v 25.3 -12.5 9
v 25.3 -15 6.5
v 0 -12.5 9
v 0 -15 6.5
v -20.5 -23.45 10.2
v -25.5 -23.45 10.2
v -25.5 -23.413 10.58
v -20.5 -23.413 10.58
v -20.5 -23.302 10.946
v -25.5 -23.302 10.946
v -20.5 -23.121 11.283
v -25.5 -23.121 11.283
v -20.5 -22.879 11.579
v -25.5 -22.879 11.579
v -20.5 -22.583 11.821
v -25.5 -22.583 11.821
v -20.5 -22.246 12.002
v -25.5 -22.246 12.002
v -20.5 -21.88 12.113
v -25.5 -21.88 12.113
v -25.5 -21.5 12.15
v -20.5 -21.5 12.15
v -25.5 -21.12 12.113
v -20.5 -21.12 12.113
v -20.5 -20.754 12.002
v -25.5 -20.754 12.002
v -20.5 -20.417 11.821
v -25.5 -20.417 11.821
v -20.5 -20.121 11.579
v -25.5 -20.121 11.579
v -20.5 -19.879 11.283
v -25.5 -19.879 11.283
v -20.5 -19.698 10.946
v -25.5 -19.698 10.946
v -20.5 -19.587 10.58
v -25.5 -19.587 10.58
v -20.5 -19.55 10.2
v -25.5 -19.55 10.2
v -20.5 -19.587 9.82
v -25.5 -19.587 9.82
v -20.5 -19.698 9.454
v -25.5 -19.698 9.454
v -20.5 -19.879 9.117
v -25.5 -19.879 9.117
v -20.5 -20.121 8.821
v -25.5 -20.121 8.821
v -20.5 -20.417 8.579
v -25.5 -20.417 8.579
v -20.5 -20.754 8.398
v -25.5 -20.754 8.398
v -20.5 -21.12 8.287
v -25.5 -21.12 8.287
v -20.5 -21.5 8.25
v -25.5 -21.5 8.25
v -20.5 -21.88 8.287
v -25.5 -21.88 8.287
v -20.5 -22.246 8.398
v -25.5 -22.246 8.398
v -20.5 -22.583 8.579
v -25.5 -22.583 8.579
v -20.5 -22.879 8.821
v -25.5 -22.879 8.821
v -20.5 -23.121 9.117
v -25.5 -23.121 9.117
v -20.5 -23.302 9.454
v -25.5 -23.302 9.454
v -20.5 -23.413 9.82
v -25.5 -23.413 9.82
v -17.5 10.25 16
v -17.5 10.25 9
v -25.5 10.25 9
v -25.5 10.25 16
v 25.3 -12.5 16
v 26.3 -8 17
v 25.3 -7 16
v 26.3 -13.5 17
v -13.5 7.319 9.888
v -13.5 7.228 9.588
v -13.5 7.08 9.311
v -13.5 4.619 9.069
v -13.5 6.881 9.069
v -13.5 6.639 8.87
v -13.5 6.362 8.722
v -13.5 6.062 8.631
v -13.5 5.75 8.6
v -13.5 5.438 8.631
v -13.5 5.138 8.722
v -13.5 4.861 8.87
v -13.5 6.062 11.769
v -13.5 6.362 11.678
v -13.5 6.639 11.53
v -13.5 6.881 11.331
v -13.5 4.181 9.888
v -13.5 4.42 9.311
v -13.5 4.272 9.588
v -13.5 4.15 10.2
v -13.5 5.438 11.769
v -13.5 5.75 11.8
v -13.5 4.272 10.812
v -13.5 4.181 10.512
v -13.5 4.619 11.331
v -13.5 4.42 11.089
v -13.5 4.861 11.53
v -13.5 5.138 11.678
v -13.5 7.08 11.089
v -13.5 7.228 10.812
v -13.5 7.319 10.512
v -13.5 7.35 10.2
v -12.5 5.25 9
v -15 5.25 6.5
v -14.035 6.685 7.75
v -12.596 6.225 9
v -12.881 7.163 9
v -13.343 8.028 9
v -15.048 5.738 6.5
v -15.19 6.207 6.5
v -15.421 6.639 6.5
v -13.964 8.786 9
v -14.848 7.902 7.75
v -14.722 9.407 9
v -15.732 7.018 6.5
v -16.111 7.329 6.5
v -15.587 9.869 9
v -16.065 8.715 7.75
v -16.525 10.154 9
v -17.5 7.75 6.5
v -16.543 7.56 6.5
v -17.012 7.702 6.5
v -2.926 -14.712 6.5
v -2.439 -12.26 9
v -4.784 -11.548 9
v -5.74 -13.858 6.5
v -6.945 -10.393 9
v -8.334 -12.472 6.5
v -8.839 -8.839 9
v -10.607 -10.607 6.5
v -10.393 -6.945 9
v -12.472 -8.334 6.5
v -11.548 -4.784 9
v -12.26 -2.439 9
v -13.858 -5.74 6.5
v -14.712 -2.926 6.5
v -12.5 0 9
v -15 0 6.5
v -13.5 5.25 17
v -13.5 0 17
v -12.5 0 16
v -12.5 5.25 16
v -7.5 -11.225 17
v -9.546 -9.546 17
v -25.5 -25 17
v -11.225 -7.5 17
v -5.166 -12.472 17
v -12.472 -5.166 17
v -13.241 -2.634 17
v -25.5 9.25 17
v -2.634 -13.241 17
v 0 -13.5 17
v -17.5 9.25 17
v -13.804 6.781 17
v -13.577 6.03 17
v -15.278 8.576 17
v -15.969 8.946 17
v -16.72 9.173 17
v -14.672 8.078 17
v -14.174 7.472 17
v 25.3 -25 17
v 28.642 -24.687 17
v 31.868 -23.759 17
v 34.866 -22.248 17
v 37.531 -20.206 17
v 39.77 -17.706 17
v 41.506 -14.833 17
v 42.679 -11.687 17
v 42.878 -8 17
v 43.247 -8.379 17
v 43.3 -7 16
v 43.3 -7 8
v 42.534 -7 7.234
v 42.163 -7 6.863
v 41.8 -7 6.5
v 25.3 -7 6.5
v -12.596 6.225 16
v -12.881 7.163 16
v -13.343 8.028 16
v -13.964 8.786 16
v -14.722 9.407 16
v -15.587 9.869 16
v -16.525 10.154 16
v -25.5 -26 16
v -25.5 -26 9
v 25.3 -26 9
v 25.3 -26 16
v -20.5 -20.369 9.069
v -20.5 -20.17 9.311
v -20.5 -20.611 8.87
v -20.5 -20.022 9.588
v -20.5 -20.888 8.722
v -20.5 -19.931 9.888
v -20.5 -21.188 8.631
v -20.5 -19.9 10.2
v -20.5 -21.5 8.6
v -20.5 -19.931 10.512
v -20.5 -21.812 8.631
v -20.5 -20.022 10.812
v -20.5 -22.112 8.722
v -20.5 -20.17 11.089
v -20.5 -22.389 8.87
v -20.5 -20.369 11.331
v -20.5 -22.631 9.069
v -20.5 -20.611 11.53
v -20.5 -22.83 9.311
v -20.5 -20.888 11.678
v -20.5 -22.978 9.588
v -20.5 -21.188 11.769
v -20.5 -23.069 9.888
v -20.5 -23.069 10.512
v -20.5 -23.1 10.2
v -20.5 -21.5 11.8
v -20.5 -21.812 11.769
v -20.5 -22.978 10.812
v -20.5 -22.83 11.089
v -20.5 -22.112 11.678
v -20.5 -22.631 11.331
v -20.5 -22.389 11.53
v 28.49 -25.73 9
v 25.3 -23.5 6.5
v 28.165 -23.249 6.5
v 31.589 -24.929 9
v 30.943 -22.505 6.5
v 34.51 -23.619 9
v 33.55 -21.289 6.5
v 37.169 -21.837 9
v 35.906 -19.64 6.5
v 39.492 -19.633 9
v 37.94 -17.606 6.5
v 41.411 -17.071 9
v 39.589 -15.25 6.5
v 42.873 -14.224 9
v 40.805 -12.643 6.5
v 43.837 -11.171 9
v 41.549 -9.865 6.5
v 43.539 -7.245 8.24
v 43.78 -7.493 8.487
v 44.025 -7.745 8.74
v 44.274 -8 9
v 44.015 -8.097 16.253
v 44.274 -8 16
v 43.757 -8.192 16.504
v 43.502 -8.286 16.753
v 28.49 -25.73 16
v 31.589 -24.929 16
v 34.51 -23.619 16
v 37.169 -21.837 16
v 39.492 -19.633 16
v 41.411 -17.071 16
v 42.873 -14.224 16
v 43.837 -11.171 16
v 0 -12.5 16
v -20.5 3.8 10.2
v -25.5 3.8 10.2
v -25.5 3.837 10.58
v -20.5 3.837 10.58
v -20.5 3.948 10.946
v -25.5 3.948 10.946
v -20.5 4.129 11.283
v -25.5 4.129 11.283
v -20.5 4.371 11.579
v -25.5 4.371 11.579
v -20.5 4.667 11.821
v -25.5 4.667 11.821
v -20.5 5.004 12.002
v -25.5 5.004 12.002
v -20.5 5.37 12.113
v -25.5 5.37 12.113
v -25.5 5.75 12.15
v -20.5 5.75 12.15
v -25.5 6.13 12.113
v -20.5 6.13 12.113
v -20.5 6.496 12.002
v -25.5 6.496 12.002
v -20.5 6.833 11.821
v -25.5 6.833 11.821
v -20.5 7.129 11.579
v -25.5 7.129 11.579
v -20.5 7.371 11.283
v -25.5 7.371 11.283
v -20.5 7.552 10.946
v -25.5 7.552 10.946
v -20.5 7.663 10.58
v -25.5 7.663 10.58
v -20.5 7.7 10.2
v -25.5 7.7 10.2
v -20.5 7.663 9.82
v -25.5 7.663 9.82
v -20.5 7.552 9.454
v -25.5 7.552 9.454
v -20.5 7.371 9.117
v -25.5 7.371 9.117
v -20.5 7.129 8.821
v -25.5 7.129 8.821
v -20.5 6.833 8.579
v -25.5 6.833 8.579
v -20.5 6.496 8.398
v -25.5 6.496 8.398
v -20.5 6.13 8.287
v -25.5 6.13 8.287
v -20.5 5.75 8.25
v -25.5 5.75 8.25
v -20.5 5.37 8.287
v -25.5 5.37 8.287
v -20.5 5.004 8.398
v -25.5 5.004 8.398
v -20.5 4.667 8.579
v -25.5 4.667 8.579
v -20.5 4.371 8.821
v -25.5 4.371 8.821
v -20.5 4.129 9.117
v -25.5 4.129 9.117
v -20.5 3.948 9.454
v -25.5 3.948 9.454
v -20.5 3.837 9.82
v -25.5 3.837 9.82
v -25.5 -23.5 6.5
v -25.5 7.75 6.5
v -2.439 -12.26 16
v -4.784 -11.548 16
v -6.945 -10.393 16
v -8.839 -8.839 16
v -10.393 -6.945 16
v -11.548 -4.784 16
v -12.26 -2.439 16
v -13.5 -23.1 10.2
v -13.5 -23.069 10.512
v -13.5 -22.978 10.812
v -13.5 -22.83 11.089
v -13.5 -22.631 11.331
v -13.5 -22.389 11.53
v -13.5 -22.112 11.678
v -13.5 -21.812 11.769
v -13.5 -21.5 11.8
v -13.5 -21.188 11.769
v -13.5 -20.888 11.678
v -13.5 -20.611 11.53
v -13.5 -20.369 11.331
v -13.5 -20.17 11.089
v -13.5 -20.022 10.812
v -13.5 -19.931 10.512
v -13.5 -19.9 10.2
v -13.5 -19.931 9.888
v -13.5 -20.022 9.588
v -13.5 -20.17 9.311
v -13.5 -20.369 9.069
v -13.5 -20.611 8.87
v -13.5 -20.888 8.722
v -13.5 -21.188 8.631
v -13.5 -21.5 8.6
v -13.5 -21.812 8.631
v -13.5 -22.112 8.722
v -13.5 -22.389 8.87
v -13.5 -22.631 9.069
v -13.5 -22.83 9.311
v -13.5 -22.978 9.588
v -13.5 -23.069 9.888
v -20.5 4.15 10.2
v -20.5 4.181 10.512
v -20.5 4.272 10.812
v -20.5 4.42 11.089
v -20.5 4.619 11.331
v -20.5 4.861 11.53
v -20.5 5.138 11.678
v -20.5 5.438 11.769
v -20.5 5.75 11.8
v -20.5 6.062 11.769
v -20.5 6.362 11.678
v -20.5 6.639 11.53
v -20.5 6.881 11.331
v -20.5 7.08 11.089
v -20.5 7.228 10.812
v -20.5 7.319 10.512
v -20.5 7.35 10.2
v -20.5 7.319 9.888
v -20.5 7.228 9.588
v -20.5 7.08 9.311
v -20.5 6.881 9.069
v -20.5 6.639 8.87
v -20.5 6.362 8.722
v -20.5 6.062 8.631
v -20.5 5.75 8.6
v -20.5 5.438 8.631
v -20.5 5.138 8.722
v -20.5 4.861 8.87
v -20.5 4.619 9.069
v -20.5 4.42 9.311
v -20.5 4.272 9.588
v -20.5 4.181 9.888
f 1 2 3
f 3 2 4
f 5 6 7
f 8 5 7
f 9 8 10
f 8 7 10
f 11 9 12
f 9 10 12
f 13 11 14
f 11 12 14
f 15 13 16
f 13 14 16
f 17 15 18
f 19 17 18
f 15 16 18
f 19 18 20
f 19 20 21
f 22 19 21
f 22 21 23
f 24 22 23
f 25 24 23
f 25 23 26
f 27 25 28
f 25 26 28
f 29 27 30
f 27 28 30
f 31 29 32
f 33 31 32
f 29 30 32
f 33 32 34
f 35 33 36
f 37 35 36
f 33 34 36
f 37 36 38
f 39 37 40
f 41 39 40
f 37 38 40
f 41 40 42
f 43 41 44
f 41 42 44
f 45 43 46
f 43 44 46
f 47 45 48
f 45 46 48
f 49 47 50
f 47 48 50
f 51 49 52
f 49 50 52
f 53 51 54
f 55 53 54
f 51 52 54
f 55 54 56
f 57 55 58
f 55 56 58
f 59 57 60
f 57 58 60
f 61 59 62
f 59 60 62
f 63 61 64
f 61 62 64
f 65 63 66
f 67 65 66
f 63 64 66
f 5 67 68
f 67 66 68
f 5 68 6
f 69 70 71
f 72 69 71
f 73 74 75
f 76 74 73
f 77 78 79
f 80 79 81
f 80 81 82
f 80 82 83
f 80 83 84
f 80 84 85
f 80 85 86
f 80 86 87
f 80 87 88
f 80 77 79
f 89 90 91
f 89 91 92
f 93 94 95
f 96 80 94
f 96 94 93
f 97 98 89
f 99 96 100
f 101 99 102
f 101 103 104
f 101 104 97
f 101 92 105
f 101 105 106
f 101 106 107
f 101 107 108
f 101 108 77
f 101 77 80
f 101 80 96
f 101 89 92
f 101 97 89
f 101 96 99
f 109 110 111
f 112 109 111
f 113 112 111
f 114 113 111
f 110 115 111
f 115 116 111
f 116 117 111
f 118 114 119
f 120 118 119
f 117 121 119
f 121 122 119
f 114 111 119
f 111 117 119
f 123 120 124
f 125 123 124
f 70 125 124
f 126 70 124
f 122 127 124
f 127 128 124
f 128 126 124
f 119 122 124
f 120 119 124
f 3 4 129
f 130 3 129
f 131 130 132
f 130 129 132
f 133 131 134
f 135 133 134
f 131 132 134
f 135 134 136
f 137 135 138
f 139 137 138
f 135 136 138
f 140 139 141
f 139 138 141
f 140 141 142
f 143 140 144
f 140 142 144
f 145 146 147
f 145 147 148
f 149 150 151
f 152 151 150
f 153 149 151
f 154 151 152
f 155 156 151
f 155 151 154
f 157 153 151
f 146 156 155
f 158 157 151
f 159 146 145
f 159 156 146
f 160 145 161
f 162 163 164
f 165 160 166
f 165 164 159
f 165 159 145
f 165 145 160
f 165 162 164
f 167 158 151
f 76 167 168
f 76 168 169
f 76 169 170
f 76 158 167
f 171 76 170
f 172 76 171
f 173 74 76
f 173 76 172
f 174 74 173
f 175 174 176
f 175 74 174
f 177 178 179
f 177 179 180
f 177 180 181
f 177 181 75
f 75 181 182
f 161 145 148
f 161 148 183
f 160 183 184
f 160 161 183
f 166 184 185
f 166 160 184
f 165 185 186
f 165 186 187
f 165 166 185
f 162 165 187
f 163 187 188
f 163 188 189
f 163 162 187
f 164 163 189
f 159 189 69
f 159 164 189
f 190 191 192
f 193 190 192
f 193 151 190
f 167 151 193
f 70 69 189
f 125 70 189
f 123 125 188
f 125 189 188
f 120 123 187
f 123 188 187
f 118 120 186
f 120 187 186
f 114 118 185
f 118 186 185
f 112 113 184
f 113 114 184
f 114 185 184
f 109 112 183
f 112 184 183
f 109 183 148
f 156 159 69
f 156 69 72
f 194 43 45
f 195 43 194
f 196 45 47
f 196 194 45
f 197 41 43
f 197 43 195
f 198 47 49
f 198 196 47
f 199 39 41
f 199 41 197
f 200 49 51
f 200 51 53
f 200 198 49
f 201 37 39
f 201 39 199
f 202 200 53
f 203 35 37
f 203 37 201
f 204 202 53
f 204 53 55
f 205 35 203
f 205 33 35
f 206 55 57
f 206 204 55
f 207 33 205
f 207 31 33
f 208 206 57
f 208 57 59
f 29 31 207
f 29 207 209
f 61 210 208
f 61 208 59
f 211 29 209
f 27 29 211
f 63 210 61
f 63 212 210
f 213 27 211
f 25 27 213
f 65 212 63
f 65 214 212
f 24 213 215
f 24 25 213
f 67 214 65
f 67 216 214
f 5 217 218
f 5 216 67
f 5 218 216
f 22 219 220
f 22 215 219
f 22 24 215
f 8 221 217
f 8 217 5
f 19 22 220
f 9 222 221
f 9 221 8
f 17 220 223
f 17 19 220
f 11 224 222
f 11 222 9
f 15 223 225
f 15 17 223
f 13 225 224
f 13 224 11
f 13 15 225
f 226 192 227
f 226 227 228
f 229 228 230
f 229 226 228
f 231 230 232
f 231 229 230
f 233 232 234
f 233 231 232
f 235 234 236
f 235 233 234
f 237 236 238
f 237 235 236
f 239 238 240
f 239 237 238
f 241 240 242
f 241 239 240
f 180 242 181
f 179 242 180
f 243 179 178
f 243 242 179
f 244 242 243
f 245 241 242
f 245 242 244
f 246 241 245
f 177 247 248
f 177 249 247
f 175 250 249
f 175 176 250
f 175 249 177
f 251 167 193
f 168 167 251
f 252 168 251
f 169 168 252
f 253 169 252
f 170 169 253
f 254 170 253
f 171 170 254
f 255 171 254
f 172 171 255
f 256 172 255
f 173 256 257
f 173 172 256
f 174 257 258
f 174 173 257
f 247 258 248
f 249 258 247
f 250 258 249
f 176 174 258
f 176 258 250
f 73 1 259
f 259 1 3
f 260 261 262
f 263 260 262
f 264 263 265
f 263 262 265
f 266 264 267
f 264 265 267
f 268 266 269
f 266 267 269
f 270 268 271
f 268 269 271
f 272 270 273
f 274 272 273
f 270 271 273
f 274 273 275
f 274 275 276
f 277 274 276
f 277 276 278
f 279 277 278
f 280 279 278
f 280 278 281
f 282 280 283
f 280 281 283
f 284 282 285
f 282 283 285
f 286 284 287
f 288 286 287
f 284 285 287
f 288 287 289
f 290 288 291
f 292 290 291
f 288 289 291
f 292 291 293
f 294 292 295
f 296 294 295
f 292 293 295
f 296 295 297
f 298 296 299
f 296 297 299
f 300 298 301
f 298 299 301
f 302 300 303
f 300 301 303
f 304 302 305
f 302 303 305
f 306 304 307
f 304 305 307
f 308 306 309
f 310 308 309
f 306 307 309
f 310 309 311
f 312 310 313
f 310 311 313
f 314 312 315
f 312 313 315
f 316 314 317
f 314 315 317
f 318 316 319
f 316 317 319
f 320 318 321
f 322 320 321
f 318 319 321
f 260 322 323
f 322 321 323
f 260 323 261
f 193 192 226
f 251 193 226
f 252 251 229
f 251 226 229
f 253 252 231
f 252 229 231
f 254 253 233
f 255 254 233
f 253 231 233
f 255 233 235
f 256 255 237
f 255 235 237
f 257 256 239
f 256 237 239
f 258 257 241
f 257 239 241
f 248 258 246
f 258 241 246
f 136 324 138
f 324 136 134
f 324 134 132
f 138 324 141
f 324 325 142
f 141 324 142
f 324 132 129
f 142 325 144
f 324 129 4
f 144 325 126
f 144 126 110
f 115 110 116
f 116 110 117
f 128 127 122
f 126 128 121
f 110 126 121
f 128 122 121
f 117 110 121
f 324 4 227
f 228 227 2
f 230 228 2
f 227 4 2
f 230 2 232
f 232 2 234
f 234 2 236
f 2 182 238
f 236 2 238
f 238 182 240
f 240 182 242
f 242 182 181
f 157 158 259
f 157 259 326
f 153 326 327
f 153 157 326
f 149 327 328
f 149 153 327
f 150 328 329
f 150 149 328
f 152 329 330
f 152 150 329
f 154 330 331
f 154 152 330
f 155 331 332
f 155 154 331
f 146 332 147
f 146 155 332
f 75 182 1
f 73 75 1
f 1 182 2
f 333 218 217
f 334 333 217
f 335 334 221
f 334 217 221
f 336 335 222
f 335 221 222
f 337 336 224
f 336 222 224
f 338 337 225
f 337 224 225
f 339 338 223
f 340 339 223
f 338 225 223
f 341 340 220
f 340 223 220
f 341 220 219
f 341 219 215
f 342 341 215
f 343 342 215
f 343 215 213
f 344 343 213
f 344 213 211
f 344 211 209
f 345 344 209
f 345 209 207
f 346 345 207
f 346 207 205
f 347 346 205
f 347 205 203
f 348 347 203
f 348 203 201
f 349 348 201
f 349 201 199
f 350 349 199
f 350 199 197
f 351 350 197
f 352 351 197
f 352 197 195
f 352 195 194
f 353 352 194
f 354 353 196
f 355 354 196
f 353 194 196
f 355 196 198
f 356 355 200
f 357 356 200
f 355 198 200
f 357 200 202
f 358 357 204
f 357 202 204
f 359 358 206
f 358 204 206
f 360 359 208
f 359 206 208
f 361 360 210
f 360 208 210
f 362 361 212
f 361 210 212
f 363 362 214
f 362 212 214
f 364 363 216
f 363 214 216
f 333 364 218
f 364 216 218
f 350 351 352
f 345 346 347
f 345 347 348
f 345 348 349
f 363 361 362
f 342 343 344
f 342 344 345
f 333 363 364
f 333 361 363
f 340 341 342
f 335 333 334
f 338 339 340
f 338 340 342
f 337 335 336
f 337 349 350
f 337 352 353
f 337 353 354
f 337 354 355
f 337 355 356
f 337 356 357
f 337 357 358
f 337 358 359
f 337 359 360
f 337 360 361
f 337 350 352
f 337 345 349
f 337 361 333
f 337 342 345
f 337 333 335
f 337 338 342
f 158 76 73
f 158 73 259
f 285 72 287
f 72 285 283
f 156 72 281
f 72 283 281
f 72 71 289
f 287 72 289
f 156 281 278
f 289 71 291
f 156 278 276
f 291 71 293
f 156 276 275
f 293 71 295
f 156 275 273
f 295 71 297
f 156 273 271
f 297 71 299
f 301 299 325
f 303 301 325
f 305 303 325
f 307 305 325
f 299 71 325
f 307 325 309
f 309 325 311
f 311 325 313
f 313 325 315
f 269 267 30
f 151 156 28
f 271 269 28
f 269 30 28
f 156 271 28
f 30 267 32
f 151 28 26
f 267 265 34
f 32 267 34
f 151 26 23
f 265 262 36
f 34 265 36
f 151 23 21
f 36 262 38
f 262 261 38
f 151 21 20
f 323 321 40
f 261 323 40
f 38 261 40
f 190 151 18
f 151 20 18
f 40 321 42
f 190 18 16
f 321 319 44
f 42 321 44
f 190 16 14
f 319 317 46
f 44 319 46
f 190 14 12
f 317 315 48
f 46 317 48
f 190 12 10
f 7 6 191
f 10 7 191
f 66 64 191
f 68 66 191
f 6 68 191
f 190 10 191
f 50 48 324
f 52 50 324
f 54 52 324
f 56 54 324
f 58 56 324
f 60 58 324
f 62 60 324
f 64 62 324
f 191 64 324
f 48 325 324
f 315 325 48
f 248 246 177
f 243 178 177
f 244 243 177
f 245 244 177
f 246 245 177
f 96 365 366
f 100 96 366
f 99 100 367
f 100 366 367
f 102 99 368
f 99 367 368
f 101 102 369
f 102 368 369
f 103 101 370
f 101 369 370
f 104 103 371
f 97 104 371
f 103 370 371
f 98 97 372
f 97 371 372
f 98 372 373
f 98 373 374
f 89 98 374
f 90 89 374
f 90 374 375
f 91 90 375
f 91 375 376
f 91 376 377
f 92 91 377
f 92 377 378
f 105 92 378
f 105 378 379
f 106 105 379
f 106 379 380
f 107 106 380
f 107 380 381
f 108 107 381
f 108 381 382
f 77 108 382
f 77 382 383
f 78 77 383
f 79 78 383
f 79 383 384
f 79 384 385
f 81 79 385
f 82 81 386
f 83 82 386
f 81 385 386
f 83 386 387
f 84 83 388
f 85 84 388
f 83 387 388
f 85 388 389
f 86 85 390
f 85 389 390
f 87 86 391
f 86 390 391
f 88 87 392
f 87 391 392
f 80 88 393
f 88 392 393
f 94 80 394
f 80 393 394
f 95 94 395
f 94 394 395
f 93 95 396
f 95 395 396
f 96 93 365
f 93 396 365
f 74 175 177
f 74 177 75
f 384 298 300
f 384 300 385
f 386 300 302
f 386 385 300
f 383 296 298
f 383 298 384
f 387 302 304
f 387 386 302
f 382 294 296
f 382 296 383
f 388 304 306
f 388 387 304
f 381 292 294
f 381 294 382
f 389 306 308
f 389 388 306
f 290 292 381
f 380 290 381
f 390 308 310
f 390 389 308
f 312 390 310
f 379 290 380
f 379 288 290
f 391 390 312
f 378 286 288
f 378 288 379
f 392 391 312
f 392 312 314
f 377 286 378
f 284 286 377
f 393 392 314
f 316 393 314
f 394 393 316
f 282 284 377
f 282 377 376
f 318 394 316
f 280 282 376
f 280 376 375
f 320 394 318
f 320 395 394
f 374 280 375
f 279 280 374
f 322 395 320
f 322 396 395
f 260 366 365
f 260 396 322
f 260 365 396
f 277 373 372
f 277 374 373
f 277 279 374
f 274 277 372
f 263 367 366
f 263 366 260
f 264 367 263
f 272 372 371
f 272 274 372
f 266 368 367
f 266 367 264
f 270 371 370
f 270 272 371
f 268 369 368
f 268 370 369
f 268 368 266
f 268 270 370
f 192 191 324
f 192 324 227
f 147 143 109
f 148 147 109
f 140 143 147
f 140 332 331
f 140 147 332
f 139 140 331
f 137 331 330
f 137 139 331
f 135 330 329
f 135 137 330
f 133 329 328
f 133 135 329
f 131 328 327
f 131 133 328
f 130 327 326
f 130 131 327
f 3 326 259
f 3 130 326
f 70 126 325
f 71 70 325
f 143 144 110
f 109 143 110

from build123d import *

# Parameters (mm, degrees)
PAD_DEPTH       = 10.5
CHAMFER001_SIZE = 1
SKETCH017_R     = 1.6
POCKET010_DEPTH = 12
SKETCH018_R     = 1.95
POCKET011_DEPTH = 5
FILLET001_R     = 5
CHAMFER002_SIZE = 1
CHAMFER003_SIZE = 2.5


with BuildPart() as part:
    # Sketch016 → Pad (new body)
    with BuildSketch(Plane.XY):
        with BuildLine():
            Line((-12.5, 0), (-12.5, 10.25))
            Line((-12.5, 10.25), (-25.5, 10.25))
            Line((-25.5, 10.25), (-25.5, -26))
            Line((-25.5, -26), (25.3, -26))
            ThreePointArc((25.3, -26), (38.735029, -20.435029), (44.3, -7))
            Line((44.3, -7), (25.3, -7))
            Line((25.3, -7), (25.3, -12.5))
            Line((25.3, -12.5), (0, -12.5))
            ThreePointArc((-12.5, 0), (-8.838835, -8.838835), (0, -12.5))
        make_face()
    extrude(amount=PAD_DEPTH)

    # Chamfer001
    chamfer001_edges = [part.edges().sort_by_distance(p)[0] for p in [
        (44.3, -7, 5.25),
    ]]
    chamfer(chamfer001_edges, length=CHAMFER001_SIZE)

    # Sketch017 (on Face7 of Chamfer001) → Pocket010 (cut)
    with BuildSketch(Plane(origin=(-25.5, 0, 0), x_dir=(0, -1, 0), z_dir=(-1, 0, 0))):
        with Locations((-5.75, 3.7)):
            Circle(SKETCH017_R)
        with Locations((21.5, 3.7)):
            Circle(SKETCH017_R)
    extrude(amount=-POCKET010_DEPTH, mode=Mode.SUBTRACT)

    # Sketch018 (on Face7 of Pocket010) → Pocket011 (cut)
    with BuildSketch(Plane(origin=(-25.5, 0, 0), x_dir=(0, -1, 0), z_dir=(-1, 0, 0))):
        with Locations((-5.75, 3.7)):
            Circle(SKETCH018_R)
        with Locations((21.5, 3.7)):
            Circle(SKETCH018_R)
    extrude(amount=-POCKET011_DEPTH, mode=Mode.SUBTRACT)

    # Fillet001
    fillet001_edges = [part.edges().sort_by_distance(p)[0] for p in [
        (-12.5, 10.25, 5.25),
    ]]
    fillet(fillet001_edges, radius=FILLET001_R)

    # Chamfer002
    chamfer002_edges = [part.edges().sort_by_distance(p)[0] for p in [
        (-21.5, 10.25, 10.5),
        (-0.1, -26, 10.5),
        (-13.964466, 8.785534, 10.5),
        (-12.5, 2.625, 10.5),
        (-8.838835, -8.838835, 10.5),
        (38.376823, -20.783929, 10.5),
        (43.786842, -7.499827, 10.5),
        (34.3, -7, 10.5),
        (25.3, -9.75, 10.5),
        (12.65, -12.5, 10.5),
    ]]
    chamfer(chamfer002_edges, length=CHAMFER002_SIZE)

    # Chamfer003
    chamfer003_edges = [part.edges().sort_by_distance(p)[0] for p in [
        (-21.5, 10.25, 0),
        (-0.1, -26, 0),
    ]]
    chamfer(chamfer003_edges, length=CHAMFER003_SIZE)


with BuildPart() as part_1:
    # Body004 placement: moved
    add(part.part.moved(Location((0, 0, 6.5))))


solid = part_1.part
